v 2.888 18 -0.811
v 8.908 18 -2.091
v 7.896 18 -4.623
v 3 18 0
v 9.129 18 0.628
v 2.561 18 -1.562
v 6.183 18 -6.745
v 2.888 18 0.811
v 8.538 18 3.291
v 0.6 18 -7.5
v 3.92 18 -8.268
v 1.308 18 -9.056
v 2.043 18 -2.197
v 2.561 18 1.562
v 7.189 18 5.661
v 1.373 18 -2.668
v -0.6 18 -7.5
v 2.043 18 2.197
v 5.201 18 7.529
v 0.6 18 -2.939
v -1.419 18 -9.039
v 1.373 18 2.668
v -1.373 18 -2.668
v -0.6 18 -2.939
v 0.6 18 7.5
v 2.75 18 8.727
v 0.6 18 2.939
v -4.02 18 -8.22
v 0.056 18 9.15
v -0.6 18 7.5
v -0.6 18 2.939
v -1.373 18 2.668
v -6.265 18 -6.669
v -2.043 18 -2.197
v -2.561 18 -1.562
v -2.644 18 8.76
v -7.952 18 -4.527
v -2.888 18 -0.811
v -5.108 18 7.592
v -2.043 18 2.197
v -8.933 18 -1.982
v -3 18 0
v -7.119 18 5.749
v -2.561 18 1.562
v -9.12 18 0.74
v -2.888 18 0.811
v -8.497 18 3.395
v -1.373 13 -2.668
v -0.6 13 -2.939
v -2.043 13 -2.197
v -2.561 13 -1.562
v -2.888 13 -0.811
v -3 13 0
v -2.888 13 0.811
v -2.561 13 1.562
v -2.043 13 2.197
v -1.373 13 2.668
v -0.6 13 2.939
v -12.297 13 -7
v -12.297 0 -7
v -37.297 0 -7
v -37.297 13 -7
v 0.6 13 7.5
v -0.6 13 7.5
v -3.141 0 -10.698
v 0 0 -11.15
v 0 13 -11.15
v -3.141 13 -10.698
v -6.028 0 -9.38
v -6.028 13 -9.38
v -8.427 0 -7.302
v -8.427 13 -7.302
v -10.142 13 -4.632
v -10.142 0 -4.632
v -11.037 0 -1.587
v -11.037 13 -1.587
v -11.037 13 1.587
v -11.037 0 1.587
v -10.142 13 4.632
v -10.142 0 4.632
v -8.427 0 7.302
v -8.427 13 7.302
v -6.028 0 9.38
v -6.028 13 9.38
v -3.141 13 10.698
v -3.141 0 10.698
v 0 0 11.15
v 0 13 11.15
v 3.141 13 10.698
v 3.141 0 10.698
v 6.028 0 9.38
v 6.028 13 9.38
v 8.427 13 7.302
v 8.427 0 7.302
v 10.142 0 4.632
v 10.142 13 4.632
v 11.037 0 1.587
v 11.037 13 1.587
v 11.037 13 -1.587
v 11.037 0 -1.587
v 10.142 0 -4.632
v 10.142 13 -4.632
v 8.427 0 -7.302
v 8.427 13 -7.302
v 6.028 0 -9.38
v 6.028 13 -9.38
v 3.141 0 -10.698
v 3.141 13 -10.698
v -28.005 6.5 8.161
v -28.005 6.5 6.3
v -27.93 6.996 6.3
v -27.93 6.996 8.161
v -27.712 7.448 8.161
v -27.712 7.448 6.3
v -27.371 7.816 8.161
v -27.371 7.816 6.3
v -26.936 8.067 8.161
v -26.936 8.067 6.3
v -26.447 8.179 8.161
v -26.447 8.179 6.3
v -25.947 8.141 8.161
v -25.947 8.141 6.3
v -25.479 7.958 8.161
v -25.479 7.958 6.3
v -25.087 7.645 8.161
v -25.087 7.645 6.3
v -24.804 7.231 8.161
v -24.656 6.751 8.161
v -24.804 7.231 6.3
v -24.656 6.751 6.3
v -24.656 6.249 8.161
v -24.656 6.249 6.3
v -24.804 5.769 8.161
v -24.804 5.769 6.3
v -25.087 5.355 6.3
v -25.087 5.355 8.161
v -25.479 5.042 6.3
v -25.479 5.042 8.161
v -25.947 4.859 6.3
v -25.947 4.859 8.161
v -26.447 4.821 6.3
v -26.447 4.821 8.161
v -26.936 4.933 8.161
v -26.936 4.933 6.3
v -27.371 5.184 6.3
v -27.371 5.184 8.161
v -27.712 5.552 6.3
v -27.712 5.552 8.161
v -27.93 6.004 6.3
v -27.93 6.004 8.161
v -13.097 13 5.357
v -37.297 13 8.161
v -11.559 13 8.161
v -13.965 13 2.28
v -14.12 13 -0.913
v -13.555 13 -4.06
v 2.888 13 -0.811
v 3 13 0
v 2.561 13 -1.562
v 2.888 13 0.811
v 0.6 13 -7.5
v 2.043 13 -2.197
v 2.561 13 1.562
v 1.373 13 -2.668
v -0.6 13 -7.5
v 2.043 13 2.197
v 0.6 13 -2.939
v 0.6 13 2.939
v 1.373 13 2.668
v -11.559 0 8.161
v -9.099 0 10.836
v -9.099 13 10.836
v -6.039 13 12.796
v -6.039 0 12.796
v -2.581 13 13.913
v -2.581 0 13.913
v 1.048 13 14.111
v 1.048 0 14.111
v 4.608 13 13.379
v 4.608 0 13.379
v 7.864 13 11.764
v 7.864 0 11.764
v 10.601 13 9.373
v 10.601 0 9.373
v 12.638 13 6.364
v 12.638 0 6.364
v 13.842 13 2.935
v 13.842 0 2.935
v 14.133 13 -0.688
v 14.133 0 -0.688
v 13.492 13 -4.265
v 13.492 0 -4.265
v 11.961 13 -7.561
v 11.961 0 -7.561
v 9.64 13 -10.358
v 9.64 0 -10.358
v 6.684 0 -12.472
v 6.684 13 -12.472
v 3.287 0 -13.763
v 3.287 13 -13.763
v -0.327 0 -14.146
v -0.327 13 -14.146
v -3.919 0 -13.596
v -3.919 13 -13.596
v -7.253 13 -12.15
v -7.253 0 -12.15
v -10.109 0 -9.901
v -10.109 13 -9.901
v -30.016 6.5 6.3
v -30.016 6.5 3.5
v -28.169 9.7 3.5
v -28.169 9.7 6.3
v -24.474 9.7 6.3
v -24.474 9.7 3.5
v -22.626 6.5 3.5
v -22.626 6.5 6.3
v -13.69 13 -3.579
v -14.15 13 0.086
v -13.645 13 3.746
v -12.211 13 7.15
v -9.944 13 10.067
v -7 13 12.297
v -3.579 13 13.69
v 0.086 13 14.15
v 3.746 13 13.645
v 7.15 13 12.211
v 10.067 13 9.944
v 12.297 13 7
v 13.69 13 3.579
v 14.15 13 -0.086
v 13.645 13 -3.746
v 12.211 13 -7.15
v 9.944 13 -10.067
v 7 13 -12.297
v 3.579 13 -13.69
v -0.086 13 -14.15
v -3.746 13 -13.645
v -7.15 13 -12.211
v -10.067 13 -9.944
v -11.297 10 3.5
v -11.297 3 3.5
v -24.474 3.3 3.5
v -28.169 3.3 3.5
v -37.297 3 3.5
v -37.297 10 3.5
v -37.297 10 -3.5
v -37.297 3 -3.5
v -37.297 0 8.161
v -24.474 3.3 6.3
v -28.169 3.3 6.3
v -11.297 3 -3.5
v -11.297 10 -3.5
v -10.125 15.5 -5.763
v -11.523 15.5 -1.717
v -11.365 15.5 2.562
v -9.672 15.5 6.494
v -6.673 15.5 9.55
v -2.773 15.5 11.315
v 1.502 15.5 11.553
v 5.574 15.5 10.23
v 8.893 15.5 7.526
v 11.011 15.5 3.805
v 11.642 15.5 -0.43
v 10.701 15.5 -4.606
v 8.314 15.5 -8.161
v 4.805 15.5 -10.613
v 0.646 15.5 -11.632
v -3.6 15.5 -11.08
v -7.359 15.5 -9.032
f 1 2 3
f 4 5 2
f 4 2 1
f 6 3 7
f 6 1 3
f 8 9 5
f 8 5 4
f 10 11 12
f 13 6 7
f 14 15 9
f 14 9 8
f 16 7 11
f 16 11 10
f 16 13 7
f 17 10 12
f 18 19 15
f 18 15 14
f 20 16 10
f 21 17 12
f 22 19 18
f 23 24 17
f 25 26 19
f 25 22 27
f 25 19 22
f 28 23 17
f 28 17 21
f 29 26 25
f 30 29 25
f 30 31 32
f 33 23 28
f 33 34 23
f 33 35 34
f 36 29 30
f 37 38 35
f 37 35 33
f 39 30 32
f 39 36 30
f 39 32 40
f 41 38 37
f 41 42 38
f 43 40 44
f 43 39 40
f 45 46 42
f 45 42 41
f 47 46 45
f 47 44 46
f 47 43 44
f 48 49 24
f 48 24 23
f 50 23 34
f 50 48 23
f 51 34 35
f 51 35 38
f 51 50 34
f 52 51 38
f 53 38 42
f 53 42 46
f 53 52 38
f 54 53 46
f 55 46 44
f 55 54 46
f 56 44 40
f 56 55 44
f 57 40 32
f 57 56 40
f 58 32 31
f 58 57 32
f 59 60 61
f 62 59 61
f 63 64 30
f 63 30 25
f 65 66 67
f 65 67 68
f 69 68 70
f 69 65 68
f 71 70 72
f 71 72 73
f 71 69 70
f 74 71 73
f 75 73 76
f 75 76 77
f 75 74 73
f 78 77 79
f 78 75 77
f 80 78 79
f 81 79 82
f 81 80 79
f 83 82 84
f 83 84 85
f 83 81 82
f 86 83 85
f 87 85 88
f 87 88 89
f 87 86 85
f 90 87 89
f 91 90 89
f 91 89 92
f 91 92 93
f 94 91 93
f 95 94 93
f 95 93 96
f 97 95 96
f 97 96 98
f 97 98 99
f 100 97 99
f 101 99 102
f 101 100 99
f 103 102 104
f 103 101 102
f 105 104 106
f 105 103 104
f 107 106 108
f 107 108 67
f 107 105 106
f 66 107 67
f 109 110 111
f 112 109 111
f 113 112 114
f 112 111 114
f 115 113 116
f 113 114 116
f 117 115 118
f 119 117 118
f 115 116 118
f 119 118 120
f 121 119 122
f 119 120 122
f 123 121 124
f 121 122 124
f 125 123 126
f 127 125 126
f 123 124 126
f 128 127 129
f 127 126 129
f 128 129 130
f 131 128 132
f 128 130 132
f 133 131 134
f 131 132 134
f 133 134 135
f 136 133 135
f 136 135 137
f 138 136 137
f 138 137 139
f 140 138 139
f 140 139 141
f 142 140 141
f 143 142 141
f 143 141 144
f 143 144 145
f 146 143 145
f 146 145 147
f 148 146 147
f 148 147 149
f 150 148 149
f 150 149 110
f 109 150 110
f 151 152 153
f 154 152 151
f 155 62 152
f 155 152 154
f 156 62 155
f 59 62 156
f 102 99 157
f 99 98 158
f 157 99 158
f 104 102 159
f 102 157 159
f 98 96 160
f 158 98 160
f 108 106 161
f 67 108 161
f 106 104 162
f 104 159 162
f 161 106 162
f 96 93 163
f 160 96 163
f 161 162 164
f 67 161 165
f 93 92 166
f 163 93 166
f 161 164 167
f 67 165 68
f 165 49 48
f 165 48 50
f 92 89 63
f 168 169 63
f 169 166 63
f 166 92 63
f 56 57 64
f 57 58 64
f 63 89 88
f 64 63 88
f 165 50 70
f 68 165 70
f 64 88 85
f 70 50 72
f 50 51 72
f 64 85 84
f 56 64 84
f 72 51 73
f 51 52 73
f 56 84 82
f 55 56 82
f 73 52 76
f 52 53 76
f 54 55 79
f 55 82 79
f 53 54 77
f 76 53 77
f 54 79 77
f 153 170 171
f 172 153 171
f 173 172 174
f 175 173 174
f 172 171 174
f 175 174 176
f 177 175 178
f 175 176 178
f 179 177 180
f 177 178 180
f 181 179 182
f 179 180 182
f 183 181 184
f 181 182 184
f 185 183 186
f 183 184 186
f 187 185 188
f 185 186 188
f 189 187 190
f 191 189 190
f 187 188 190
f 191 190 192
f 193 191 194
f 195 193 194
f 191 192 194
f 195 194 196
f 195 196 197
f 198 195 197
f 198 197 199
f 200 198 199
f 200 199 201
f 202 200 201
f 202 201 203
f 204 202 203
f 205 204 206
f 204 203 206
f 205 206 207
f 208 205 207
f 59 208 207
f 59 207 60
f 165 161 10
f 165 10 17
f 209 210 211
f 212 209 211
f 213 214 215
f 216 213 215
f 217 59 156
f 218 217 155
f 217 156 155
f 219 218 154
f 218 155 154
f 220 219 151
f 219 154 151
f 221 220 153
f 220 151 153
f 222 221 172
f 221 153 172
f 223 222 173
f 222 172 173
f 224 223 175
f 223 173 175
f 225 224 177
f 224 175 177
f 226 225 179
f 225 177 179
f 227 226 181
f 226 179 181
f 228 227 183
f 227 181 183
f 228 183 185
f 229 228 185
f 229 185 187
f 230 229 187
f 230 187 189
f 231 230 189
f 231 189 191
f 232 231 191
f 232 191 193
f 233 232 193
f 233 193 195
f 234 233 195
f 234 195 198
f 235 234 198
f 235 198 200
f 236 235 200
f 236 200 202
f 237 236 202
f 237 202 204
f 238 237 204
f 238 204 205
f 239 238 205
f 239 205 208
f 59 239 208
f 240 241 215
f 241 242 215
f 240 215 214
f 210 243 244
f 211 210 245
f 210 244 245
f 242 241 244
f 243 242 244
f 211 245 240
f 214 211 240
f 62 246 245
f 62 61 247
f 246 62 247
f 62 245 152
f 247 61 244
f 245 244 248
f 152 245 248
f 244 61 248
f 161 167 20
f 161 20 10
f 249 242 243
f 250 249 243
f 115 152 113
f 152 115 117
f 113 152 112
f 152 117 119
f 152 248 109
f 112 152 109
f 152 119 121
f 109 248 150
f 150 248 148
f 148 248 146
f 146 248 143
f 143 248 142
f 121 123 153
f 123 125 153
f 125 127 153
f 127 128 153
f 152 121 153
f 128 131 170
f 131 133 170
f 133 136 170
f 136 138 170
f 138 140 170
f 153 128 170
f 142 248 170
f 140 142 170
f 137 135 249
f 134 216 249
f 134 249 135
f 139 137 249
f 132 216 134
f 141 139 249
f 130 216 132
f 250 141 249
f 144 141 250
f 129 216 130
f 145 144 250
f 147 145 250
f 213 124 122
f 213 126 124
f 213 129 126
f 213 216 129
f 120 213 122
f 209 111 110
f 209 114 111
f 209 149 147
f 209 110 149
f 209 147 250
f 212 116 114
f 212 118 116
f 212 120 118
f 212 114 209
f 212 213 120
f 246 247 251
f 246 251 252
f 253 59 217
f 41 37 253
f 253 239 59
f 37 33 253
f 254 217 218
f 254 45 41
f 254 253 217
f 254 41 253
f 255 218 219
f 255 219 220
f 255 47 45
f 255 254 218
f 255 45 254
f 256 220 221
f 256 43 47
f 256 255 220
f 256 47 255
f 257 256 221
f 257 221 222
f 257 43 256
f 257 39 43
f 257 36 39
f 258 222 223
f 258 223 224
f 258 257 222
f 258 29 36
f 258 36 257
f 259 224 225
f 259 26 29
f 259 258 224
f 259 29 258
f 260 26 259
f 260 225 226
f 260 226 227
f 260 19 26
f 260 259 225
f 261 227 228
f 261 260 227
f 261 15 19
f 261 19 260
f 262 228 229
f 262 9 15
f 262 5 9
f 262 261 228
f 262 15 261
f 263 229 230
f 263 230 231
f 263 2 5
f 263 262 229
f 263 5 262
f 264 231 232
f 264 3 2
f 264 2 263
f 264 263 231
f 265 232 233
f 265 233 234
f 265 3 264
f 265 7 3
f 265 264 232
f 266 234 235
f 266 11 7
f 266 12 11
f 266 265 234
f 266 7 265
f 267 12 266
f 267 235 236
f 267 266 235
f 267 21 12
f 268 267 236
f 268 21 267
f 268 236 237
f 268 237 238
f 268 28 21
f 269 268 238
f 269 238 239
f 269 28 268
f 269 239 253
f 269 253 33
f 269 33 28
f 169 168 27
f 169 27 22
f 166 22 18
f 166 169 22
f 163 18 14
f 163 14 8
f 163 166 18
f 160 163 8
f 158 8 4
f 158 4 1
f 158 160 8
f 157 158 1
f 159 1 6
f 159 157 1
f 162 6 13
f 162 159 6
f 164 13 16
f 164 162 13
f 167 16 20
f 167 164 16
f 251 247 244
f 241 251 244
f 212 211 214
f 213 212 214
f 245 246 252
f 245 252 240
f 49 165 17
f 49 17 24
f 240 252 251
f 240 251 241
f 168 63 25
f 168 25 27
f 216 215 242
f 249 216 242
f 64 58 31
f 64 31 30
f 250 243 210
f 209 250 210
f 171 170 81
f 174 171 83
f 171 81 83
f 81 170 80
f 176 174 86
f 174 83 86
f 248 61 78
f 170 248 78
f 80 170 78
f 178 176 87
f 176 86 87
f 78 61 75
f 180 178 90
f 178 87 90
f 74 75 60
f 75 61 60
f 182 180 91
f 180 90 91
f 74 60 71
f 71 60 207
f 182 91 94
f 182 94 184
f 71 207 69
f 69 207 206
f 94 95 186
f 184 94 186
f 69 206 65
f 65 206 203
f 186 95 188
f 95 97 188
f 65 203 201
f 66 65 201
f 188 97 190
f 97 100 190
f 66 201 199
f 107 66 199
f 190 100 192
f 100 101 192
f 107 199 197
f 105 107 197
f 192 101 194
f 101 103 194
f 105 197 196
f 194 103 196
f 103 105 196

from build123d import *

# Parameters (mm, degrees)
ESBO_O2_R                = 11.15
RESSALTO_EXTRUS_O1_DEPTH = 13
ESBO_O3_W                = 7
ESBO_O3_H                = 7
CORTE_EXTRUS_O1_DEPTH    = 26
CORTE_EXTRUS_O2_DEPTH    = 2.8
ESBO_O10_R               = 1.683661958
CORTE_EXTRUS_O3_DEPTH    = 2.8
ESBO_O11_R               = 14.15
RESSALTO_EXTRUS_O2_DEPTH = 5
CHANFRO1_SIZE            = 5


with BuildPart() as part:
    # Esboço2 → Ressalto-extrusão1 (new body)
    with BuildSketch(Plane(origin=(0, 0, 0), x_dir=(1, 0, 0), z_dir=(0, 1, 0))):
        with BuildLine():
            Line((-12.297255791, 7), (-37.297255791, 7))
            Line((-37.297255791, 7), (-37.297255791, -8.161034979))
            Line((-37.297255791, -8.161034979), (-11.559412099, -8.161034979))
            ThreePointArc((-11.559412099, -8.161034979), (14.133272661, 0.687825475), (-12.297255791, 7))
        make_face()
        with Locations(Location((0, 0, 0), (0, 0, 90))):
            Circle(ESBO_O2_R, mode=Mode.SUBTRACT)
    extrude(amount=RESSALTO_EXTRUS_O1_DEPTH)

    # Esboço3 → Corte-extrusão1 (cut)
    with BuildSketch(Plane.ZY.offset(37.297255791)):
        with Locations((0, 6.5)):
            Rectangle(ESBO_O3_W, ESBO_O3_H)
    extrude(amount=-CORTE_EXTRUS_O1_DEPTH, mode=Mode.SUBTRACT)

    # Esboço7 → Corte-extrusão2 (cut)
    with BuildSketch(Plane(origin=(0, 0, 3.5), x_dir=(-1, 0, 0), z_dir=(0, 0, -1))):
        Polygon((22.62619922, 6.5), (24.473720081, 3.3), (28.168761804, 3.3), (30.016282665, 6.5), (28.168761804, 9.7), (24.473720081, 9.7), align=None)
    extrude(amount=-CORTE_EXTRUS_O2_DEPTH, mode=Mode.SUBTRACT)

    # Esboço10 → Corte-extrusão3 (cut)
    with BuildSketch(Plane(origin=(0, 0, 6.3), x_dir=(-1, 0, 0), z_dir=(0, 0, -1))):
        with Locations((26.321240942, 6.5)):
            Circle(ESBO_O10_R)
    extrude(amount=-CORTE_EXTRUS_O3_DEPTH, mode=Mode.SUBTRACT)

    # Esboço11 → Ressalto-extrusão2 (add)
    with BuildSketch(Plane(origin=(0, 13, 0), x_dir=(1, 0, 0), z_dir=(0, 1, 0))):
        with Locations(Location((0, 0, 0), (0, 0, 150.350053351))):
            Circle(ESBO_O11_R)
        with BuildLine():
            Line((0.6, -7.5), (0.6, -2.939387691))
            ThreePointArc((0.6, -2.939387691), (3, 0), (0.6, 2.939387691))
            Line((0.6, 2.939387691), (0.6, 7.5))
            Line((0.6, 7.5), (-0.6, 7.5))
            Line((-0.6, 7.5), (-0.6, 2.939387691))
            ThreePointArc((-0.6, 2.939387691), (-3, 0), (-0.6, -2.939387691))
            Line((-0.6, -2.939387691), (-0.6, -7.5))
            Line((-0.6, -7.5), (0.6, -7.5))
        make_face(mode=Mode.SUBTRACT)
    extrude(amount=RESSALTO_EXTRUS_O2_DEPTH)

    # Chanfro1
    chanfro1_edges = [part.edges().sort_by_distance(p)[0] for p in [
        (12.297255791, 18, 7),
    ]]
    chamfer(chanfro1_edges, length=CHANFRO1_SIZE - 0.0001)  # a hair under: the kernel refuses the full size


solid = part.part
